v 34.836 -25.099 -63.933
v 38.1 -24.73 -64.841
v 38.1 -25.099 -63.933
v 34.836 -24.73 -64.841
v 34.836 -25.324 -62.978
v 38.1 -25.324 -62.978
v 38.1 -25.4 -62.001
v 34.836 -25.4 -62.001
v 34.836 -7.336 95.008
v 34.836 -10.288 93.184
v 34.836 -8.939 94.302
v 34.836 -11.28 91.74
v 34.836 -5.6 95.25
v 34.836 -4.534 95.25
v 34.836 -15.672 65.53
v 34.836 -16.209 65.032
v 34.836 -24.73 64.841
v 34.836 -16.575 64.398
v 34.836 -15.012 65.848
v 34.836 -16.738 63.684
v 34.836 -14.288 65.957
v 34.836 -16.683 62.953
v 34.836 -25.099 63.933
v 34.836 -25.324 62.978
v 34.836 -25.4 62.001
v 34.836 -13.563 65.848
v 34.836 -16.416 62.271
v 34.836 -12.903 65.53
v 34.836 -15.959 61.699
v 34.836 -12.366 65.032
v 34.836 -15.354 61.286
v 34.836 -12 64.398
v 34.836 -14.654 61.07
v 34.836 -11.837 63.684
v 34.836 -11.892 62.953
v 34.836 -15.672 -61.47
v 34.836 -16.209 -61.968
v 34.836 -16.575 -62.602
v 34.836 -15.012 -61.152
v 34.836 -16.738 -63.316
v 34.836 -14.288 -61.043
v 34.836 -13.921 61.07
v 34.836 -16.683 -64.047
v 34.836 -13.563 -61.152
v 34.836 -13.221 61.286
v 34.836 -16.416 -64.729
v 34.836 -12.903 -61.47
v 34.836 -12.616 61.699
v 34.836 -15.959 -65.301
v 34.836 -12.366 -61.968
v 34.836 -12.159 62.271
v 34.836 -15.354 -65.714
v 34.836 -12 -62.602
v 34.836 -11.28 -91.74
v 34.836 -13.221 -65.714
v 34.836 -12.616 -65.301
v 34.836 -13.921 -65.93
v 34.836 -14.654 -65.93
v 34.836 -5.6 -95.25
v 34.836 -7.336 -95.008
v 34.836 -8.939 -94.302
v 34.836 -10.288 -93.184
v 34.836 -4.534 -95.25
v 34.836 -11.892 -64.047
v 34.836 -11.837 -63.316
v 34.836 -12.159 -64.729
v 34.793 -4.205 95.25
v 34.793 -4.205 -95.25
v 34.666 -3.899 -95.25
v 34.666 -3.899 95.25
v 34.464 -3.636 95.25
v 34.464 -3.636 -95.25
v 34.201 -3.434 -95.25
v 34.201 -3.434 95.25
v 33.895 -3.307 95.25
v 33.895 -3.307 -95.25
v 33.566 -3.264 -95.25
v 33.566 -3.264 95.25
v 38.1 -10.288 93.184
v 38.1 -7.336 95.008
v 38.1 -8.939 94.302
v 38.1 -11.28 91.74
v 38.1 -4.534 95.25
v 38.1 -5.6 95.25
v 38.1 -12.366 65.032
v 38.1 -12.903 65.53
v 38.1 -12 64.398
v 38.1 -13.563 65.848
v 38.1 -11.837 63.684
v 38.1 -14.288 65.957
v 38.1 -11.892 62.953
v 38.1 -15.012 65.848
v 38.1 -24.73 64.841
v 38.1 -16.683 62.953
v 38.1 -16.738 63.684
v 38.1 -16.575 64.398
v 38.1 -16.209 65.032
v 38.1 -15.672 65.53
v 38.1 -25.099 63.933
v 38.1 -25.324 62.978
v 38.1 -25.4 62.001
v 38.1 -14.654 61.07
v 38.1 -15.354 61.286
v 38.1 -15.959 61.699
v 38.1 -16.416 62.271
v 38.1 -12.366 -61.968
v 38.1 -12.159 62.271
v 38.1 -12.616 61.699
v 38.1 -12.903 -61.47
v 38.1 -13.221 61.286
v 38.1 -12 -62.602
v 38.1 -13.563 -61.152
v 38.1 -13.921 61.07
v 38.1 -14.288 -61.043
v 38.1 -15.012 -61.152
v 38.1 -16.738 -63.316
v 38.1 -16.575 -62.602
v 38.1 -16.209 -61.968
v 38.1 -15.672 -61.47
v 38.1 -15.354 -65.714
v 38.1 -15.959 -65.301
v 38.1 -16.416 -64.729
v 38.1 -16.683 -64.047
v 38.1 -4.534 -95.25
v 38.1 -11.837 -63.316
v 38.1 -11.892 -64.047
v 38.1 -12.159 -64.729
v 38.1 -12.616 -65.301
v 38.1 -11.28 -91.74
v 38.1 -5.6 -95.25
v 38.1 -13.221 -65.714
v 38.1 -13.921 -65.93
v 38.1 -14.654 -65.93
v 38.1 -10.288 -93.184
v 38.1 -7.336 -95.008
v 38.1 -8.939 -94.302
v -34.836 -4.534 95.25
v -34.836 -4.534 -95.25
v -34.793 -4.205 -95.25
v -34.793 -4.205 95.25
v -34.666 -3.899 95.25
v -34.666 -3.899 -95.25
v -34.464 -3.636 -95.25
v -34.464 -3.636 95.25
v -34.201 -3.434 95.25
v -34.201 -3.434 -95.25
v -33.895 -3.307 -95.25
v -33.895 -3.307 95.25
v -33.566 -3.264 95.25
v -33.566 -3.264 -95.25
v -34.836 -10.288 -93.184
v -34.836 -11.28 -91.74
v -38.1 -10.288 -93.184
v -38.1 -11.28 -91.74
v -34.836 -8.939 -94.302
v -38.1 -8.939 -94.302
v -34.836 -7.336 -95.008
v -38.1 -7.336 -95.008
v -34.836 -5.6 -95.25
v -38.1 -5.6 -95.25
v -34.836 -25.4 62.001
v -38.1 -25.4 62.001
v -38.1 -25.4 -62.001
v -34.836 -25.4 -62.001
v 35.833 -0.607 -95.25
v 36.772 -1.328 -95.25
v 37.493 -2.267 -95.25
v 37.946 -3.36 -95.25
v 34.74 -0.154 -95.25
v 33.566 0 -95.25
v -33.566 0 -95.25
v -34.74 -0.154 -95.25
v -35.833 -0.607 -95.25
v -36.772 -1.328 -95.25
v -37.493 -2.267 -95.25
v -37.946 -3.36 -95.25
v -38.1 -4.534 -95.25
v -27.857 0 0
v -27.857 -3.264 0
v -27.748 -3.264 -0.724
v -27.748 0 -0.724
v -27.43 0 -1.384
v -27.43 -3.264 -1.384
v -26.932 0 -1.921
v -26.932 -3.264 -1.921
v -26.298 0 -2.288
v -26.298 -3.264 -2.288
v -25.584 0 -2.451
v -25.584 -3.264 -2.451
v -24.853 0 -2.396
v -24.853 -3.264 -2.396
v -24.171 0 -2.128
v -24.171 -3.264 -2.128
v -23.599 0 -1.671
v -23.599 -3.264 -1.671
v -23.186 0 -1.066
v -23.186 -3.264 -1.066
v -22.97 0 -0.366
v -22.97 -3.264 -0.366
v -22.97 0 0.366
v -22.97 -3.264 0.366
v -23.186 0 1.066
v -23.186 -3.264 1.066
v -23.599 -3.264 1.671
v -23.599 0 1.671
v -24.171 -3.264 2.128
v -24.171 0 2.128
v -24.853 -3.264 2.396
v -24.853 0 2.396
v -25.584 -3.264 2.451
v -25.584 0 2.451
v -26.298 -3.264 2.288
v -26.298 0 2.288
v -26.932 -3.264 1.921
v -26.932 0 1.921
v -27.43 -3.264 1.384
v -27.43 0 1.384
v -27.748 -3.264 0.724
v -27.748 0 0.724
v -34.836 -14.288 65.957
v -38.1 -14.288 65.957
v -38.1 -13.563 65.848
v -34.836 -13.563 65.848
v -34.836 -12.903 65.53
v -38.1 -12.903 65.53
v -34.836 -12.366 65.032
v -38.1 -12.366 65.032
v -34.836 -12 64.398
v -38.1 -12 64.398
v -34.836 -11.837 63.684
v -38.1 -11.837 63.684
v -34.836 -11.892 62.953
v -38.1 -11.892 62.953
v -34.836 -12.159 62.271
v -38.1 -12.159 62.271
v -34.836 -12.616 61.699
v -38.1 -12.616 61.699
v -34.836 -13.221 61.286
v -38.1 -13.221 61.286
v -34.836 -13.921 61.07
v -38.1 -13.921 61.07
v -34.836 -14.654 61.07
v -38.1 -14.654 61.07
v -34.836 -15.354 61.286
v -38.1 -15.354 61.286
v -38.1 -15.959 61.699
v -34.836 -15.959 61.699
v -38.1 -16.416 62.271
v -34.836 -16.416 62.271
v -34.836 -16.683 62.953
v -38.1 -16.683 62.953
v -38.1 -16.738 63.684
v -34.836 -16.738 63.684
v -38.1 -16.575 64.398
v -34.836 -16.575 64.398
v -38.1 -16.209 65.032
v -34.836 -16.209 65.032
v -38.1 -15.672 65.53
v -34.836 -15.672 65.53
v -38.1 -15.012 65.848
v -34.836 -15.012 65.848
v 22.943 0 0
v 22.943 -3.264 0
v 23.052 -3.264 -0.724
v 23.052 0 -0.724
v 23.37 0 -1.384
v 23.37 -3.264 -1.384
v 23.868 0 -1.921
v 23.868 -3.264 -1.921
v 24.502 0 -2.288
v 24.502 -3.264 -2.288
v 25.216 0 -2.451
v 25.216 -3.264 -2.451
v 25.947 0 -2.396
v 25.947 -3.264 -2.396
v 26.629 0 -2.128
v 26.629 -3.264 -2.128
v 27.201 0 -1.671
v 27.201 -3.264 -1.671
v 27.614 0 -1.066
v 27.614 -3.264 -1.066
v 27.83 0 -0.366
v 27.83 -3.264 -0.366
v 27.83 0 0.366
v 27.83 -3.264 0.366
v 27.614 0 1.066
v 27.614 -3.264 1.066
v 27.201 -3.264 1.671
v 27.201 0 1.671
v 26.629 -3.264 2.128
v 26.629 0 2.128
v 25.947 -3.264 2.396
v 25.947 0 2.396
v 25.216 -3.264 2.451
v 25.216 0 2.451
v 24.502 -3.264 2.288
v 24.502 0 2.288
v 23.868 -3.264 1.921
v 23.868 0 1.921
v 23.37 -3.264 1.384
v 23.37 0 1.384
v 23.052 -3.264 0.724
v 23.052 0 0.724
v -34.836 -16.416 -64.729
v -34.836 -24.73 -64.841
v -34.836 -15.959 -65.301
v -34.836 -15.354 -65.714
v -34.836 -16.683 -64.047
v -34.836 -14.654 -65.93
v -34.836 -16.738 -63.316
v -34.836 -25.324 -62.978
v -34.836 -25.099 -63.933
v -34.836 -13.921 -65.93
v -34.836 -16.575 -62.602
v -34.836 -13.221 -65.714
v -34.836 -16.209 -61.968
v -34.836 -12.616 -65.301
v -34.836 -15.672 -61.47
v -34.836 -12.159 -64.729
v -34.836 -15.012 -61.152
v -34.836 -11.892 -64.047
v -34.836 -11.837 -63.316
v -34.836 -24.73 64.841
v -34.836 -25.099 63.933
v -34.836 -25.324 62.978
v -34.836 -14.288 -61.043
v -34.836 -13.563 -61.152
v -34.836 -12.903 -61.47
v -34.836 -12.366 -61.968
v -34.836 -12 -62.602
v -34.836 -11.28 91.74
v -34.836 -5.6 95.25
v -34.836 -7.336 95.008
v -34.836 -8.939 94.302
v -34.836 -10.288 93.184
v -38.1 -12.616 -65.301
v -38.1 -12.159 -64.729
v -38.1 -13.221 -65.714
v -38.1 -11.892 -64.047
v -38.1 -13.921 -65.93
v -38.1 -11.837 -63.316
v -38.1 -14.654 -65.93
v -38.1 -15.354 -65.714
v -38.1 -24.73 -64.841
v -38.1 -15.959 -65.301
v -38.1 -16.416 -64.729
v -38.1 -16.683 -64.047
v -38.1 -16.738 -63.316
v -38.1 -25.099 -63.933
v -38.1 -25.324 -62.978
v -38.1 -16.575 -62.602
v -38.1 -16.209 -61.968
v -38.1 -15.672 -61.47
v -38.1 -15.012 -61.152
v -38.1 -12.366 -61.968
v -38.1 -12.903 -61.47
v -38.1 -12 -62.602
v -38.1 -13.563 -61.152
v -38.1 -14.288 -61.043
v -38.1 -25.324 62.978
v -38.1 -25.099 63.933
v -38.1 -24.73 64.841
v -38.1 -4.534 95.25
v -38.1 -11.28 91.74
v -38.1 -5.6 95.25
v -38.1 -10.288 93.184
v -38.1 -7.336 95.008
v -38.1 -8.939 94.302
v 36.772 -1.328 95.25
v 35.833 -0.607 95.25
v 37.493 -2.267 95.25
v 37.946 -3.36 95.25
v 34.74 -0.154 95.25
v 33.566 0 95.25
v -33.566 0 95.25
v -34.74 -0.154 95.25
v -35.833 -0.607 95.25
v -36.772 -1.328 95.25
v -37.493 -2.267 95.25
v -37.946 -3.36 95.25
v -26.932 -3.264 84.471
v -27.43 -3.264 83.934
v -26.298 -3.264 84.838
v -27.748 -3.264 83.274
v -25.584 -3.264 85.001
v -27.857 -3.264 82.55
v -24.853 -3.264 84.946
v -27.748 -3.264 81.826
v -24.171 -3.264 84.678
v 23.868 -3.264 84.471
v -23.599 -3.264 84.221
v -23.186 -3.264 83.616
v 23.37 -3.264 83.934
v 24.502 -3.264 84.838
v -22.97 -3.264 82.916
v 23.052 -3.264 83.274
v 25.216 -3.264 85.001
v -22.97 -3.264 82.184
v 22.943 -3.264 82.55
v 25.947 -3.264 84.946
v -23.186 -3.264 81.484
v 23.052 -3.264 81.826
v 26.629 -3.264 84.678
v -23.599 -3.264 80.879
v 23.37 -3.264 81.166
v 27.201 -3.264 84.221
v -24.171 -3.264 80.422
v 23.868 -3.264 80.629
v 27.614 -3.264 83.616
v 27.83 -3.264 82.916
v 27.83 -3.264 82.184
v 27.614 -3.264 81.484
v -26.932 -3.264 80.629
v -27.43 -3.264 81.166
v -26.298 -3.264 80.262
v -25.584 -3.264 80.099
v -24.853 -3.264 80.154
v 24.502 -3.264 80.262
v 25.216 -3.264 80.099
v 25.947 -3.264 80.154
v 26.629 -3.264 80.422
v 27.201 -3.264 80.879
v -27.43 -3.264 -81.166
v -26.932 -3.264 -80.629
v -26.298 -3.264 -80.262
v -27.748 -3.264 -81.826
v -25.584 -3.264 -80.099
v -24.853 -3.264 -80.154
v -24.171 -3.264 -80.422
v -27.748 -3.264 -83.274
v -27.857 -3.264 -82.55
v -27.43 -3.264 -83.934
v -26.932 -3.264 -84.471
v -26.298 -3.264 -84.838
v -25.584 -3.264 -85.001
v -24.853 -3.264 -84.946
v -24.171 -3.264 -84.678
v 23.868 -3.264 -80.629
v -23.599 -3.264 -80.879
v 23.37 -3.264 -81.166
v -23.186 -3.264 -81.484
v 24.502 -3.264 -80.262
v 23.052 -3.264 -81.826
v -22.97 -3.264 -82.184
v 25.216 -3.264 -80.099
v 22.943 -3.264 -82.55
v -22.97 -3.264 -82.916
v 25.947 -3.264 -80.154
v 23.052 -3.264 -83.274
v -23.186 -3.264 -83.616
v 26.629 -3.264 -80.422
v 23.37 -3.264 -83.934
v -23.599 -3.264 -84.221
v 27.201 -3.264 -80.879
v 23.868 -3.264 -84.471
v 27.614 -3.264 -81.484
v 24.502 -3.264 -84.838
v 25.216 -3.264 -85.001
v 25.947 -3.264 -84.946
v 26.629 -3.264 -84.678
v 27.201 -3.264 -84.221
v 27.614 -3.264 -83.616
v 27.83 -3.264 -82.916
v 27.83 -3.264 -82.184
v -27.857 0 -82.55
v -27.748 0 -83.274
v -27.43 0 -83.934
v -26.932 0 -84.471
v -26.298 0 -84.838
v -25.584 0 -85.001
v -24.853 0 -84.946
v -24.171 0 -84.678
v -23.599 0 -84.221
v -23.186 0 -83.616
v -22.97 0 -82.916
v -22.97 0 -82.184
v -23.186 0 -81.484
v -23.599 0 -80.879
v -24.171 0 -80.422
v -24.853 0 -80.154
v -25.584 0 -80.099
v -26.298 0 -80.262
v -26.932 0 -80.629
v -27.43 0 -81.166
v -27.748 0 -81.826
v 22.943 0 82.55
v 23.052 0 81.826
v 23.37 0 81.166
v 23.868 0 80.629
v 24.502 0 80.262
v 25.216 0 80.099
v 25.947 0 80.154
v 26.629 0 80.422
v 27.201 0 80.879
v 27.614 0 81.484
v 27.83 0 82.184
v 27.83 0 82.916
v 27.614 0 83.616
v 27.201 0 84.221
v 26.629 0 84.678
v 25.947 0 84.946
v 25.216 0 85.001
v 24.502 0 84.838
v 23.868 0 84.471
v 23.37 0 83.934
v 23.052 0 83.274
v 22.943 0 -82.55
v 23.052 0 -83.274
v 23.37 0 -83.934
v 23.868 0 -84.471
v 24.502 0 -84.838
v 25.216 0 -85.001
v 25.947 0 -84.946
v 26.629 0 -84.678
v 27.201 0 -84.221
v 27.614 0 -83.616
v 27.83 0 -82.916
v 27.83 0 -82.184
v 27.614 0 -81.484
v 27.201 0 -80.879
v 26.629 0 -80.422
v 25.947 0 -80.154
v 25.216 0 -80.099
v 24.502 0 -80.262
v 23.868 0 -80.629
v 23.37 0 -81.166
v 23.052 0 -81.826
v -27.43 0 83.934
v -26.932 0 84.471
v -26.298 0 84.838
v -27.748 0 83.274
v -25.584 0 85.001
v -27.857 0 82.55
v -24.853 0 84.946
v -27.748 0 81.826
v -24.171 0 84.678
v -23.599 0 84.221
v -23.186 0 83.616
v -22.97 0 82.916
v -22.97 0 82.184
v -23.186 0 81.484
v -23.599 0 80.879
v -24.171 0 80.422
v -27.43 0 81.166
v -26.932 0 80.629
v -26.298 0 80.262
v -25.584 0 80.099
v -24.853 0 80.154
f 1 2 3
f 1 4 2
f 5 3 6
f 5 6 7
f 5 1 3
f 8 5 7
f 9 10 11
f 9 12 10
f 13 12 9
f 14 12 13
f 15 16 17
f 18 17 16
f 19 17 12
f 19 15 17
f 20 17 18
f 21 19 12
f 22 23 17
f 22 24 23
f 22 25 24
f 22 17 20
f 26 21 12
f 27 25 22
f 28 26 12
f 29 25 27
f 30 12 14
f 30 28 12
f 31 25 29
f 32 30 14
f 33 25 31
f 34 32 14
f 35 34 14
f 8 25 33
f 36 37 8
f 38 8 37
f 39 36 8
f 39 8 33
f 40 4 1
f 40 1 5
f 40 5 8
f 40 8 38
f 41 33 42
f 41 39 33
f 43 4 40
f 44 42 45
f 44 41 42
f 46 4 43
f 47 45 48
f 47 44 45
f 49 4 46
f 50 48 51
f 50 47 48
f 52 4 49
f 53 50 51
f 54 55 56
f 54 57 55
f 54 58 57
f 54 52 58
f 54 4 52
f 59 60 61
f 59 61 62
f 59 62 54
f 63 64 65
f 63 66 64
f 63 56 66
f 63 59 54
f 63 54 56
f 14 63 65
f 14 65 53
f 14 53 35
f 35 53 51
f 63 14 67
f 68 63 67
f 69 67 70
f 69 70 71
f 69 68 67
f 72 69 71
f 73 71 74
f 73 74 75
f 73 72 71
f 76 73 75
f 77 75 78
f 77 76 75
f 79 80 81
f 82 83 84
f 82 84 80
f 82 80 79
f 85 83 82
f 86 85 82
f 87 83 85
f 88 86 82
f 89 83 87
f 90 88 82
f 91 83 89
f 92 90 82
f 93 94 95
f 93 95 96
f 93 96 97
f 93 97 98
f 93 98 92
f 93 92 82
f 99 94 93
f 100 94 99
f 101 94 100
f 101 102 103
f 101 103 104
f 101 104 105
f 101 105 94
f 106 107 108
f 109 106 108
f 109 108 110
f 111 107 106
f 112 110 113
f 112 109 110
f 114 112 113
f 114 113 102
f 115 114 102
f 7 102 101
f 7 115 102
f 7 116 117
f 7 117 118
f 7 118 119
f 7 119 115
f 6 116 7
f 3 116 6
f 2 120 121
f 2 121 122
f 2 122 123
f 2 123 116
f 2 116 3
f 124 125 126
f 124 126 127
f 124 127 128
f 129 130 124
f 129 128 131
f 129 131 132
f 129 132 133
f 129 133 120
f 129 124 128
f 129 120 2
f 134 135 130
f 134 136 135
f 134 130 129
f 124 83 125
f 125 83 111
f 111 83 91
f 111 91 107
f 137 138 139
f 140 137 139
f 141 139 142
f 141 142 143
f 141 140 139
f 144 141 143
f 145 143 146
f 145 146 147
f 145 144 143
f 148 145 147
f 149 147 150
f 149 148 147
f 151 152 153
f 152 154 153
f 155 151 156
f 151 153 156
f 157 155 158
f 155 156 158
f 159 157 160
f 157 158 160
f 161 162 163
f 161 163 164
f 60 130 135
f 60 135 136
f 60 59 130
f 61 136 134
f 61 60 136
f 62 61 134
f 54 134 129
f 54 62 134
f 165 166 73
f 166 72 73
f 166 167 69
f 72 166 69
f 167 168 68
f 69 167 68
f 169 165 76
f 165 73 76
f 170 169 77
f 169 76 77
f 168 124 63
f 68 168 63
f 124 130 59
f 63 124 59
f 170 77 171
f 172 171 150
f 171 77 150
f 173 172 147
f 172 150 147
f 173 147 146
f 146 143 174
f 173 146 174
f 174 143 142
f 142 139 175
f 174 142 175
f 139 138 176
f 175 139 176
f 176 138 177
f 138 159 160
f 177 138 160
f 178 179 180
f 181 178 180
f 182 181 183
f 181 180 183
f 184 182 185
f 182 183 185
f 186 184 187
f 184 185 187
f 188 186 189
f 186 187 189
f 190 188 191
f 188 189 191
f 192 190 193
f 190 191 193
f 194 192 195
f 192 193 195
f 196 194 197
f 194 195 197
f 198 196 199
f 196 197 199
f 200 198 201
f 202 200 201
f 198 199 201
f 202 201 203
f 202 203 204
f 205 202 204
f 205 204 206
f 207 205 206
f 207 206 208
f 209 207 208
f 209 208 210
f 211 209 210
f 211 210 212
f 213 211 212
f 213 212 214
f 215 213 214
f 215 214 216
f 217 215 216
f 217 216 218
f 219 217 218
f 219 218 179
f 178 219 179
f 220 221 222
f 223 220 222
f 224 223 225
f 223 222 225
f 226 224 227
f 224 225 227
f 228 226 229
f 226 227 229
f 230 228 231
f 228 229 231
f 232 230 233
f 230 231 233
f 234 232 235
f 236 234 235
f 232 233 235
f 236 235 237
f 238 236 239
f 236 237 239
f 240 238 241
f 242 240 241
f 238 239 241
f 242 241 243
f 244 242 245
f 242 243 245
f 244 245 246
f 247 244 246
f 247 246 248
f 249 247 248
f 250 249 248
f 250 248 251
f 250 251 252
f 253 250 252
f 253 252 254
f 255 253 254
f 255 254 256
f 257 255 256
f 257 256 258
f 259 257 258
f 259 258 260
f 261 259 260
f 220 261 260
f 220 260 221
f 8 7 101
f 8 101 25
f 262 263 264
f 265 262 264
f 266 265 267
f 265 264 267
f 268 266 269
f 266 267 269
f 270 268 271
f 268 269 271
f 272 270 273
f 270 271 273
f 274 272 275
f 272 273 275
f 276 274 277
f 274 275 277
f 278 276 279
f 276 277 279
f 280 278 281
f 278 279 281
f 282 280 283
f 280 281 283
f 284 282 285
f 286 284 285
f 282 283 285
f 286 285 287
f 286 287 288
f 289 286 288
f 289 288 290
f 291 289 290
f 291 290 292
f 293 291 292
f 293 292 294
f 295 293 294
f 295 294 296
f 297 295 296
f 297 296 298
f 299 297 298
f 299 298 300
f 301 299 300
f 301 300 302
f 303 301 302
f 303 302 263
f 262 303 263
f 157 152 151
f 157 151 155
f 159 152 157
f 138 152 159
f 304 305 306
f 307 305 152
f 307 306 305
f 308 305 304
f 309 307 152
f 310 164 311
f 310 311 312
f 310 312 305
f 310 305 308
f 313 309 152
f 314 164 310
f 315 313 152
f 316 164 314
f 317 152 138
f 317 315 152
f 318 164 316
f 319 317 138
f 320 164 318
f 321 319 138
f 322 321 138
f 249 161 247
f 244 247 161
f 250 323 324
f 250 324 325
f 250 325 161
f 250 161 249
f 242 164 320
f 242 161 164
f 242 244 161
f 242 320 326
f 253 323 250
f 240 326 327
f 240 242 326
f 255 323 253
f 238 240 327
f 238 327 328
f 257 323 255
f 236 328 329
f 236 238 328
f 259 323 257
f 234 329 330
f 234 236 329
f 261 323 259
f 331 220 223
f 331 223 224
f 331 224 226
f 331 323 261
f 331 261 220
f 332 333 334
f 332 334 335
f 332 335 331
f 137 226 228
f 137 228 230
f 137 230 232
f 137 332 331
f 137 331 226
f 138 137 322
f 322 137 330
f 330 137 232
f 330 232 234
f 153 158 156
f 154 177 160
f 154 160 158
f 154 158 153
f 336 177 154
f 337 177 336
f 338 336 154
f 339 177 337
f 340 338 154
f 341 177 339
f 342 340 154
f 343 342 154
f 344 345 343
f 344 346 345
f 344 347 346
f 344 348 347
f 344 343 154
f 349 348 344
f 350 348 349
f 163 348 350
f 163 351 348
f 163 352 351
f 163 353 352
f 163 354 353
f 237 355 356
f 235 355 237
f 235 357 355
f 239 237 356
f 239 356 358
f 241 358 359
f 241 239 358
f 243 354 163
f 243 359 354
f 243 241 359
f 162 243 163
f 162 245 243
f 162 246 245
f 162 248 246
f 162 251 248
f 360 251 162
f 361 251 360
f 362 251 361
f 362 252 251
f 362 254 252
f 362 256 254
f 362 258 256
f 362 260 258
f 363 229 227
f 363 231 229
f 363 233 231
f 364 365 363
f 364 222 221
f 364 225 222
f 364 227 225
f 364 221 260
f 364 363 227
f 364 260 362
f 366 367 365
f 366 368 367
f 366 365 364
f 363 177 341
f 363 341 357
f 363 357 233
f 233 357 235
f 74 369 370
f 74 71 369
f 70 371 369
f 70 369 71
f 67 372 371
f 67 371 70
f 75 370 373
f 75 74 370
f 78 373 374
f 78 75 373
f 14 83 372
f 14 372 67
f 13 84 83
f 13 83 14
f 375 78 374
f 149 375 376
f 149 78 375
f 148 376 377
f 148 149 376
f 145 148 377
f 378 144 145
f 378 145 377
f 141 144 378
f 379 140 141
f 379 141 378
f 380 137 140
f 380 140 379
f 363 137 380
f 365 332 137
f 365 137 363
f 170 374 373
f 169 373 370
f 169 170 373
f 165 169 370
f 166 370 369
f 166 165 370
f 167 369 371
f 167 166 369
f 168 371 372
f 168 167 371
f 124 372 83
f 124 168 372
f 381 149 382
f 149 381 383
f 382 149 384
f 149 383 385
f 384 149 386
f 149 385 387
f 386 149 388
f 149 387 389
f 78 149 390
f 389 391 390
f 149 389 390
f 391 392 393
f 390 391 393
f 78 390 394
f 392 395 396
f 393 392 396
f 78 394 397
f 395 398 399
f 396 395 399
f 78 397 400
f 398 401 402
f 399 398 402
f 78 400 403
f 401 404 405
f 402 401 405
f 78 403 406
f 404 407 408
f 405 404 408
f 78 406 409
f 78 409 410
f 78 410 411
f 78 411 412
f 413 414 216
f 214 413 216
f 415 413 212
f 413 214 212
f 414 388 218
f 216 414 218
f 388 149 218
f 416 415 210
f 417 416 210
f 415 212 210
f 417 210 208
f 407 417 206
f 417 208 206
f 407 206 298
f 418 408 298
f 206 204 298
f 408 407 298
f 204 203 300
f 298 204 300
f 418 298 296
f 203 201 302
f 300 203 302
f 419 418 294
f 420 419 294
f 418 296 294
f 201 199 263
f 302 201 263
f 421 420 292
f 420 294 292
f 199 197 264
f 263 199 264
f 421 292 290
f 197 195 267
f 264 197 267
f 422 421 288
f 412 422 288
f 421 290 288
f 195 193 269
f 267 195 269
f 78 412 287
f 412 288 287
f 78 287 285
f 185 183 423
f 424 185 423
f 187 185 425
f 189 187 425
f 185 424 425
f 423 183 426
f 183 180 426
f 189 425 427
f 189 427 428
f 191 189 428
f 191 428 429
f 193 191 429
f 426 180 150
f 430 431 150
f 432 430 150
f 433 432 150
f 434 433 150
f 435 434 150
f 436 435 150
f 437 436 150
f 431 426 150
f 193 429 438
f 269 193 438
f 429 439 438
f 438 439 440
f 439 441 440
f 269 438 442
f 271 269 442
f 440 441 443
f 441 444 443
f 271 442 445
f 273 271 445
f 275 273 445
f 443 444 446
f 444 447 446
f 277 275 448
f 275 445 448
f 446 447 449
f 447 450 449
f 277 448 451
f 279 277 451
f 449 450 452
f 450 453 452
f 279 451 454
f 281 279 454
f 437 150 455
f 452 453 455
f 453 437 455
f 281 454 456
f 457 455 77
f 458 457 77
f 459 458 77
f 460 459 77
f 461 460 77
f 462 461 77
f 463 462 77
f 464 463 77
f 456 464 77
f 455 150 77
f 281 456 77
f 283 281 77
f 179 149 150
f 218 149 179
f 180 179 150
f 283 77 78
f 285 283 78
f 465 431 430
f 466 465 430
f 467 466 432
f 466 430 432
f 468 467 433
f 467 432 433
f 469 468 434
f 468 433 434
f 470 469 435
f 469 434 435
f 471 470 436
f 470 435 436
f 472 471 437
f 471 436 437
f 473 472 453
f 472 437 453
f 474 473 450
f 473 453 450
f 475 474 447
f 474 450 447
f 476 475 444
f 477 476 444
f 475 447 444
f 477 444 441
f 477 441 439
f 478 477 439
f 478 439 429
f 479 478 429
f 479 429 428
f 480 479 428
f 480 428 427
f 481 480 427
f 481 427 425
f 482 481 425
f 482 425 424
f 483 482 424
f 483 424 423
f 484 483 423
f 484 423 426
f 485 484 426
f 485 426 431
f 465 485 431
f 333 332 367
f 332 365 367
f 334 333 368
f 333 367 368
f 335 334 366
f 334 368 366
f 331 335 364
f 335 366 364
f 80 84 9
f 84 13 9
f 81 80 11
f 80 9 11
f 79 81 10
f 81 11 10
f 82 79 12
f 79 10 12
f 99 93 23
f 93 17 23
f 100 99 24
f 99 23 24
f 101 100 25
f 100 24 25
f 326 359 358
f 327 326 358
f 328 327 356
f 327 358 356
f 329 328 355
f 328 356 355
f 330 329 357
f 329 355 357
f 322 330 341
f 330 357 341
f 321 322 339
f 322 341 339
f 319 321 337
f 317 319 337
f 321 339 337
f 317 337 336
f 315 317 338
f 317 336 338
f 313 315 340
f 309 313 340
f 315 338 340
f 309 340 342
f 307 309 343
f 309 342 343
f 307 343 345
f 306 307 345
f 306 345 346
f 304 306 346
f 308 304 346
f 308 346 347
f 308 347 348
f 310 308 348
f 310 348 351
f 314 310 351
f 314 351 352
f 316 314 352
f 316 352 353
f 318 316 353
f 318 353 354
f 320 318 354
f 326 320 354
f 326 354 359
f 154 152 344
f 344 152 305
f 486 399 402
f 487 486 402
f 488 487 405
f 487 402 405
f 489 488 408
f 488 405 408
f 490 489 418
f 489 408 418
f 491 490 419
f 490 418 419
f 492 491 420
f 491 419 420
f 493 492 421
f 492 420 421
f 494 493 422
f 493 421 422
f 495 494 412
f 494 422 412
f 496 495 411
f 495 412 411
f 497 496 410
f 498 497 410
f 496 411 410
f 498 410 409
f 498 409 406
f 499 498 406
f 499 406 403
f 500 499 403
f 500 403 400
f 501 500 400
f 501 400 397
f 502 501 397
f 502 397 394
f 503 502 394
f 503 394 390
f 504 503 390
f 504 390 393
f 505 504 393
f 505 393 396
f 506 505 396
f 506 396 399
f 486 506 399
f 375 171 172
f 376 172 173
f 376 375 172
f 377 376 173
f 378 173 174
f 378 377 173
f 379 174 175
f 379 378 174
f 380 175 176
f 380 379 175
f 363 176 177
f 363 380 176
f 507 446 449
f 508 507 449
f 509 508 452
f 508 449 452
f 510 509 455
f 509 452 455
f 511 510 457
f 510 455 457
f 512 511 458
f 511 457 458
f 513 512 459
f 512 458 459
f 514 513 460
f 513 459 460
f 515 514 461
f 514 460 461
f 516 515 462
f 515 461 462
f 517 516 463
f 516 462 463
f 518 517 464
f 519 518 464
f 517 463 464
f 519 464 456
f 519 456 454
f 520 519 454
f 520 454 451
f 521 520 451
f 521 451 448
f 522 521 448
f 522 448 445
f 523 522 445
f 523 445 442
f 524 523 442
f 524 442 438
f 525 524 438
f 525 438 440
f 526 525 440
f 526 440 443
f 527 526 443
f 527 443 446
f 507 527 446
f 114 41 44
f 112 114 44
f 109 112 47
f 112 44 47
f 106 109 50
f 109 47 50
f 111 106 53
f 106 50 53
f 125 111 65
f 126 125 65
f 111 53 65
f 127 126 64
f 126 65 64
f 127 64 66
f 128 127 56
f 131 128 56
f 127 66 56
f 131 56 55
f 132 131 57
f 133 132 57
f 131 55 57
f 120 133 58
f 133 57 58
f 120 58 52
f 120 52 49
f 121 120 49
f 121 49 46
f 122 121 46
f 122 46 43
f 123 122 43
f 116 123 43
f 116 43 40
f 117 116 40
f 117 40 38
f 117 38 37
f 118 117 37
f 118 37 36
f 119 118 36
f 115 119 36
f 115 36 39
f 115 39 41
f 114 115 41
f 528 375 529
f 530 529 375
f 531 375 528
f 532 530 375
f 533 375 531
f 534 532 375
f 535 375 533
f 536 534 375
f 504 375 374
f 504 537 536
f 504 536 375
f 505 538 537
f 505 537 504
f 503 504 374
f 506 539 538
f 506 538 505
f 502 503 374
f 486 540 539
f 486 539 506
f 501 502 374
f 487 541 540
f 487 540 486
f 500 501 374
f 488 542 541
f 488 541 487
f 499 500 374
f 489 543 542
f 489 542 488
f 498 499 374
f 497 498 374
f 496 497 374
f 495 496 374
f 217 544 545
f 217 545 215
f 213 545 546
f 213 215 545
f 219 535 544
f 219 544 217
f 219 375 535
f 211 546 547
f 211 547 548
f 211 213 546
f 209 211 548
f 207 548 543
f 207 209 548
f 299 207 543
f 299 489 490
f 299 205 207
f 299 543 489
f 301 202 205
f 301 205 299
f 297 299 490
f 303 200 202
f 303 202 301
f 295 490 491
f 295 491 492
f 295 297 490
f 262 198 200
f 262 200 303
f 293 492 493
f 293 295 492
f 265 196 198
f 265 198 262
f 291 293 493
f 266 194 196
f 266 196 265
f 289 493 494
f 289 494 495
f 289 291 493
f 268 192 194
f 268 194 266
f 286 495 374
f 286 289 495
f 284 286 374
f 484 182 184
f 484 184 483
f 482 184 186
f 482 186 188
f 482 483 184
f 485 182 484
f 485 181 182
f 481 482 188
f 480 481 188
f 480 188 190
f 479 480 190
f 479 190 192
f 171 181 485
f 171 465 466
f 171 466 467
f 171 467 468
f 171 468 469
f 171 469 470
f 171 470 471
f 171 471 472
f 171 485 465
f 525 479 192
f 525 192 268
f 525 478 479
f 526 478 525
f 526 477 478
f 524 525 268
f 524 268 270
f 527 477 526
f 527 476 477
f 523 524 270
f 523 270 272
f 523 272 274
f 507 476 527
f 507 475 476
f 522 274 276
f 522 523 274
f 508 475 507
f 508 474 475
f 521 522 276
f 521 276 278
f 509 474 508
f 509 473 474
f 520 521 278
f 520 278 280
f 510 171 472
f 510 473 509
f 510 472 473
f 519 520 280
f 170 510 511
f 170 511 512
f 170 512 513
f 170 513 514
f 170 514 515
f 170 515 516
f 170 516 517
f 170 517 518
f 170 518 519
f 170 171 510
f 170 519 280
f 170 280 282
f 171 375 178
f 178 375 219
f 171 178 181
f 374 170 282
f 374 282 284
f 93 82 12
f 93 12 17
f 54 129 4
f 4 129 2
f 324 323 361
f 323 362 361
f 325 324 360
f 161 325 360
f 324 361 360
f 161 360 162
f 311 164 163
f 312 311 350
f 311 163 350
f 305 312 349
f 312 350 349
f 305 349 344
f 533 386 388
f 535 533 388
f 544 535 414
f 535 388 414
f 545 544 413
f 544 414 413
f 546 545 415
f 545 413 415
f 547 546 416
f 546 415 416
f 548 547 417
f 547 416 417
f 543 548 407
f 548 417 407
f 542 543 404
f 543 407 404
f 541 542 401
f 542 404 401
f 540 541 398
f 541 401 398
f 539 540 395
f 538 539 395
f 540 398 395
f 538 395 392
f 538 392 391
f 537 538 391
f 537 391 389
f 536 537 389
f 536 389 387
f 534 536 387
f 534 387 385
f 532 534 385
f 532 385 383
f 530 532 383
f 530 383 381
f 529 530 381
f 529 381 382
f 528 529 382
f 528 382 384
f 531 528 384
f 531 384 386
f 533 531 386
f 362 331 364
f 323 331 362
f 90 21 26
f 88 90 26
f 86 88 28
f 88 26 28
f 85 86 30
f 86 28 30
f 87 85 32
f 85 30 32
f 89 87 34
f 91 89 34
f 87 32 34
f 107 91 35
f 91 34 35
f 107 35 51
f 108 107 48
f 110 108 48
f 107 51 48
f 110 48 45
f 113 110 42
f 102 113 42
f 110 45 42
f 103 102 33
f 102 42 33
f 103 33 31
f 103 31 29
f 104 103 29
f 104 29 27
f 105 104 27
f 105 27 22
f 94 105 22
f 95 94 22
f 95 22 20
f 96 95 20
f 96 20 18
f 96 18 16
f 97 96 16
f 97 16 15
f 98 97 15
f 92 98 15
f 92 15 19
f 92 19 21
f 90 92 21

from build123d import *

# Parameters (mm, degrees)
SKETCH1_W                      = 76.2
SKETCH1_H                      = 190.5
BASE_FLANGE1_DEPTH             = 3.2639
EDGE_FLANGE1_STRIP_W           = 15.5956
EDGE_FLANGE1_STRIP_H           = 3.2639
EDGE_FLANGE1_STRIP_CUT_DEPTH   = 190.5
EDGE_FLANGE1_STRIP_2_W         = 15.5956
EDGE_FLANGE1_STRIP_2_H         = 3.2639
EDGE_FLANGE1_STRIP_CUT_2_DEPTH = 190.5
EDGE_FLANGE1_DEPTH             = 190.5
EDGE_FLANGE1_BEND_DEPTH        = 190.5
F_10_0_1935_DIAMETER_HOLE1_D   = 4.9149
F_10_0_1935_DIAMETER_HOLE2_D   = 4.9149
CUT_EXTRUDE1_DEPTH             = 125.595997127
FILLET2_R                      = 6.35


# Sheet-metal steps are written as plain solids
with BuildPart() as part:
    # Sketch1 → Base-Flange1 (new body)
    with BuildSketch(Plane(origin=(0, 0, 0), x_dir=(1, 0, 0), z_dir=(0, 1, 0))):
        Rectangle(SKETCH1_W, SKETCH1_H)
    extrude(amount=-BASE_FLANGE1_DEPTH)

    # Edge-Flange1 strip (across the edge) → Edge-Flange1 strip cut (cut)
    with BuildSketch(Plane(origin=(38.1, -3.2639, -95.25), x_dir=(-1, 0, 0), z_dir=(0, 0, 1))):
        with Locations((-3.2639, -1.63195)):
            Rectangle(EDGE_FLANGE1_STRIP_W, EDGE_FLANGE1_STRIP_H)
    extrude(amount=EDGE_FLANGE1_STRIP_CUT_DEPTH, mode=Mode.SUBTRACT)

    # Edge-Flange1 strip 2 (across the edge) → Edge-Flange1 strip cut 2 (cut)
    with BuildSketch(Plane(origin=(-38.1, -3.2639, 95.25), x_dir=(1, 0, 0), z_dir=(0, 0, -1))):
        with Locations((-3.2639, -1.63195)):
            Rectangle(EDGE_FLANGE1_STRIP_2_W, EDGE_FLANGE1_STRIP_2_H)
    extrude(amount=EDGE_FLANGE1_STRIP_CUT_2_DEPTH, mode=Mode.SUBTRACT)

    # Edge-Flange1 section (across the edge) → Edge-Flange1 (add)
    with BuildSketch(Plane(origin=(38.1, -3.2639, -95.25), x_dir=(-1, 0, 0), z_dir=(0, 0, 1))):
        with BuildLine():
            Line((0, 1.27), (0, 22.1361))
            Line((0, 22.1361), (3.2639, 22.1361))
            Line((3.2639, 22.1361), (3.2639, 1.27))
            ThreePointArc((3.2639, 1.27), (3.635874388, 0.371974388), (4.5339, 0))
            Line((4.5339, 0), (4.5339, -3.2639))
            ThreePointArc((4.5339, -3.2639), (1.327948565, -1.935951435), (0, 1.27))
        make_face()
    extrude(amount=EDGE_FLANGE1_DEPTH)

    # Edge-Flange1 section 2 (across the edge) → Edge-Flange1 bend (add)
    with BuildSketch(Plane(origin=(-38.1, -3.2639, 95.25), x_dir=(1, 0, 0), z_dir=(0, 0, -1))):
        with BuildLine():
            Line((0, 1.27), (0, 22.1361))
            Line((0, 22.1361), (3.2639, 22.1361))
            Line((3.2639, 22.1361), (3.2639, 1.27))
            ThreePointArc((3.2639, 1.27), (3.635874388, 0.371974388), (4.5339, 0))
            Line((4.5339, 0), (4.5339, -3.2639))
            ThreePointArc((4.5339, -3.2639), (1.327948565, -1.935951435), (0, 1.27))
        make_face()
    extrude(amount=EDGE_FLANGE1_BEND_DEPTH)

    # #10 (0.1935) Diameter Hole1 (through all)
    with Locations(Plane(origin=(0, 0, 0), x_dir=(1, 0, 0), z_dir=(0, 1, 0))):
        with Locations((-25.4, 82.55), (25.4, 82.55), (-25.4, 0), (25.4, 0), (25.4, -82.55), (-25.4, -82.55)):
            Hole(F_10_0_1935_DIAMETER_HOLE1_D / 2)

    # #10 (0.1935) Diameter Hole2 (through all)
    with Locations(Plane(origin=(38.1, 0, 0), x_dir=(0, 0, -1), z_dir=(1, 0, 0))):
        with Locations((-63.5, -14.2875), (63.5, -14.2875)):
            Hole(F_10_0_1935_DIAMETER_HOLE2_D / 2)

    # Sketch19 → Cut-Extrude1 (cut, through all)
    with BuildSketch(Plane(origin=(38.1, 0, 0), x_dir=(0, 0, -1), z_dir=(1, 0, 0))):
        Polygon((-95.25, -9.525), (-63.5, -25.4), (-95.25, -25.4), align=None)
        Polygon((63.5, -25.4), (95.25, -25.4), (95.25, -9.525), align=None)
    extrude(amount=-CUT_EXTRUDE1_DEPTH, mode=Mode.SUBTRACT)

    # Fillet2
    fillet2_edges = [part.edges().sort_by_distance(p)[0] for p in [
        (36.46805, -25.4, 63.5),
        (36.46805, -9.525, 95.25),
        (-36.46805, -9.525, 95.25),
        (-36.46805, -25.4, 63.5),
        (36.46805, -25.4, -63.5),
        (36.46805, -9.525, -95.25),
        (-36.46805, -25.4, -63.5),
        (-36.46805, -9.525, -95.25),
    ]]
    fillet(fillet2_edges, radius=FILLET2_R)


solid = part.part
